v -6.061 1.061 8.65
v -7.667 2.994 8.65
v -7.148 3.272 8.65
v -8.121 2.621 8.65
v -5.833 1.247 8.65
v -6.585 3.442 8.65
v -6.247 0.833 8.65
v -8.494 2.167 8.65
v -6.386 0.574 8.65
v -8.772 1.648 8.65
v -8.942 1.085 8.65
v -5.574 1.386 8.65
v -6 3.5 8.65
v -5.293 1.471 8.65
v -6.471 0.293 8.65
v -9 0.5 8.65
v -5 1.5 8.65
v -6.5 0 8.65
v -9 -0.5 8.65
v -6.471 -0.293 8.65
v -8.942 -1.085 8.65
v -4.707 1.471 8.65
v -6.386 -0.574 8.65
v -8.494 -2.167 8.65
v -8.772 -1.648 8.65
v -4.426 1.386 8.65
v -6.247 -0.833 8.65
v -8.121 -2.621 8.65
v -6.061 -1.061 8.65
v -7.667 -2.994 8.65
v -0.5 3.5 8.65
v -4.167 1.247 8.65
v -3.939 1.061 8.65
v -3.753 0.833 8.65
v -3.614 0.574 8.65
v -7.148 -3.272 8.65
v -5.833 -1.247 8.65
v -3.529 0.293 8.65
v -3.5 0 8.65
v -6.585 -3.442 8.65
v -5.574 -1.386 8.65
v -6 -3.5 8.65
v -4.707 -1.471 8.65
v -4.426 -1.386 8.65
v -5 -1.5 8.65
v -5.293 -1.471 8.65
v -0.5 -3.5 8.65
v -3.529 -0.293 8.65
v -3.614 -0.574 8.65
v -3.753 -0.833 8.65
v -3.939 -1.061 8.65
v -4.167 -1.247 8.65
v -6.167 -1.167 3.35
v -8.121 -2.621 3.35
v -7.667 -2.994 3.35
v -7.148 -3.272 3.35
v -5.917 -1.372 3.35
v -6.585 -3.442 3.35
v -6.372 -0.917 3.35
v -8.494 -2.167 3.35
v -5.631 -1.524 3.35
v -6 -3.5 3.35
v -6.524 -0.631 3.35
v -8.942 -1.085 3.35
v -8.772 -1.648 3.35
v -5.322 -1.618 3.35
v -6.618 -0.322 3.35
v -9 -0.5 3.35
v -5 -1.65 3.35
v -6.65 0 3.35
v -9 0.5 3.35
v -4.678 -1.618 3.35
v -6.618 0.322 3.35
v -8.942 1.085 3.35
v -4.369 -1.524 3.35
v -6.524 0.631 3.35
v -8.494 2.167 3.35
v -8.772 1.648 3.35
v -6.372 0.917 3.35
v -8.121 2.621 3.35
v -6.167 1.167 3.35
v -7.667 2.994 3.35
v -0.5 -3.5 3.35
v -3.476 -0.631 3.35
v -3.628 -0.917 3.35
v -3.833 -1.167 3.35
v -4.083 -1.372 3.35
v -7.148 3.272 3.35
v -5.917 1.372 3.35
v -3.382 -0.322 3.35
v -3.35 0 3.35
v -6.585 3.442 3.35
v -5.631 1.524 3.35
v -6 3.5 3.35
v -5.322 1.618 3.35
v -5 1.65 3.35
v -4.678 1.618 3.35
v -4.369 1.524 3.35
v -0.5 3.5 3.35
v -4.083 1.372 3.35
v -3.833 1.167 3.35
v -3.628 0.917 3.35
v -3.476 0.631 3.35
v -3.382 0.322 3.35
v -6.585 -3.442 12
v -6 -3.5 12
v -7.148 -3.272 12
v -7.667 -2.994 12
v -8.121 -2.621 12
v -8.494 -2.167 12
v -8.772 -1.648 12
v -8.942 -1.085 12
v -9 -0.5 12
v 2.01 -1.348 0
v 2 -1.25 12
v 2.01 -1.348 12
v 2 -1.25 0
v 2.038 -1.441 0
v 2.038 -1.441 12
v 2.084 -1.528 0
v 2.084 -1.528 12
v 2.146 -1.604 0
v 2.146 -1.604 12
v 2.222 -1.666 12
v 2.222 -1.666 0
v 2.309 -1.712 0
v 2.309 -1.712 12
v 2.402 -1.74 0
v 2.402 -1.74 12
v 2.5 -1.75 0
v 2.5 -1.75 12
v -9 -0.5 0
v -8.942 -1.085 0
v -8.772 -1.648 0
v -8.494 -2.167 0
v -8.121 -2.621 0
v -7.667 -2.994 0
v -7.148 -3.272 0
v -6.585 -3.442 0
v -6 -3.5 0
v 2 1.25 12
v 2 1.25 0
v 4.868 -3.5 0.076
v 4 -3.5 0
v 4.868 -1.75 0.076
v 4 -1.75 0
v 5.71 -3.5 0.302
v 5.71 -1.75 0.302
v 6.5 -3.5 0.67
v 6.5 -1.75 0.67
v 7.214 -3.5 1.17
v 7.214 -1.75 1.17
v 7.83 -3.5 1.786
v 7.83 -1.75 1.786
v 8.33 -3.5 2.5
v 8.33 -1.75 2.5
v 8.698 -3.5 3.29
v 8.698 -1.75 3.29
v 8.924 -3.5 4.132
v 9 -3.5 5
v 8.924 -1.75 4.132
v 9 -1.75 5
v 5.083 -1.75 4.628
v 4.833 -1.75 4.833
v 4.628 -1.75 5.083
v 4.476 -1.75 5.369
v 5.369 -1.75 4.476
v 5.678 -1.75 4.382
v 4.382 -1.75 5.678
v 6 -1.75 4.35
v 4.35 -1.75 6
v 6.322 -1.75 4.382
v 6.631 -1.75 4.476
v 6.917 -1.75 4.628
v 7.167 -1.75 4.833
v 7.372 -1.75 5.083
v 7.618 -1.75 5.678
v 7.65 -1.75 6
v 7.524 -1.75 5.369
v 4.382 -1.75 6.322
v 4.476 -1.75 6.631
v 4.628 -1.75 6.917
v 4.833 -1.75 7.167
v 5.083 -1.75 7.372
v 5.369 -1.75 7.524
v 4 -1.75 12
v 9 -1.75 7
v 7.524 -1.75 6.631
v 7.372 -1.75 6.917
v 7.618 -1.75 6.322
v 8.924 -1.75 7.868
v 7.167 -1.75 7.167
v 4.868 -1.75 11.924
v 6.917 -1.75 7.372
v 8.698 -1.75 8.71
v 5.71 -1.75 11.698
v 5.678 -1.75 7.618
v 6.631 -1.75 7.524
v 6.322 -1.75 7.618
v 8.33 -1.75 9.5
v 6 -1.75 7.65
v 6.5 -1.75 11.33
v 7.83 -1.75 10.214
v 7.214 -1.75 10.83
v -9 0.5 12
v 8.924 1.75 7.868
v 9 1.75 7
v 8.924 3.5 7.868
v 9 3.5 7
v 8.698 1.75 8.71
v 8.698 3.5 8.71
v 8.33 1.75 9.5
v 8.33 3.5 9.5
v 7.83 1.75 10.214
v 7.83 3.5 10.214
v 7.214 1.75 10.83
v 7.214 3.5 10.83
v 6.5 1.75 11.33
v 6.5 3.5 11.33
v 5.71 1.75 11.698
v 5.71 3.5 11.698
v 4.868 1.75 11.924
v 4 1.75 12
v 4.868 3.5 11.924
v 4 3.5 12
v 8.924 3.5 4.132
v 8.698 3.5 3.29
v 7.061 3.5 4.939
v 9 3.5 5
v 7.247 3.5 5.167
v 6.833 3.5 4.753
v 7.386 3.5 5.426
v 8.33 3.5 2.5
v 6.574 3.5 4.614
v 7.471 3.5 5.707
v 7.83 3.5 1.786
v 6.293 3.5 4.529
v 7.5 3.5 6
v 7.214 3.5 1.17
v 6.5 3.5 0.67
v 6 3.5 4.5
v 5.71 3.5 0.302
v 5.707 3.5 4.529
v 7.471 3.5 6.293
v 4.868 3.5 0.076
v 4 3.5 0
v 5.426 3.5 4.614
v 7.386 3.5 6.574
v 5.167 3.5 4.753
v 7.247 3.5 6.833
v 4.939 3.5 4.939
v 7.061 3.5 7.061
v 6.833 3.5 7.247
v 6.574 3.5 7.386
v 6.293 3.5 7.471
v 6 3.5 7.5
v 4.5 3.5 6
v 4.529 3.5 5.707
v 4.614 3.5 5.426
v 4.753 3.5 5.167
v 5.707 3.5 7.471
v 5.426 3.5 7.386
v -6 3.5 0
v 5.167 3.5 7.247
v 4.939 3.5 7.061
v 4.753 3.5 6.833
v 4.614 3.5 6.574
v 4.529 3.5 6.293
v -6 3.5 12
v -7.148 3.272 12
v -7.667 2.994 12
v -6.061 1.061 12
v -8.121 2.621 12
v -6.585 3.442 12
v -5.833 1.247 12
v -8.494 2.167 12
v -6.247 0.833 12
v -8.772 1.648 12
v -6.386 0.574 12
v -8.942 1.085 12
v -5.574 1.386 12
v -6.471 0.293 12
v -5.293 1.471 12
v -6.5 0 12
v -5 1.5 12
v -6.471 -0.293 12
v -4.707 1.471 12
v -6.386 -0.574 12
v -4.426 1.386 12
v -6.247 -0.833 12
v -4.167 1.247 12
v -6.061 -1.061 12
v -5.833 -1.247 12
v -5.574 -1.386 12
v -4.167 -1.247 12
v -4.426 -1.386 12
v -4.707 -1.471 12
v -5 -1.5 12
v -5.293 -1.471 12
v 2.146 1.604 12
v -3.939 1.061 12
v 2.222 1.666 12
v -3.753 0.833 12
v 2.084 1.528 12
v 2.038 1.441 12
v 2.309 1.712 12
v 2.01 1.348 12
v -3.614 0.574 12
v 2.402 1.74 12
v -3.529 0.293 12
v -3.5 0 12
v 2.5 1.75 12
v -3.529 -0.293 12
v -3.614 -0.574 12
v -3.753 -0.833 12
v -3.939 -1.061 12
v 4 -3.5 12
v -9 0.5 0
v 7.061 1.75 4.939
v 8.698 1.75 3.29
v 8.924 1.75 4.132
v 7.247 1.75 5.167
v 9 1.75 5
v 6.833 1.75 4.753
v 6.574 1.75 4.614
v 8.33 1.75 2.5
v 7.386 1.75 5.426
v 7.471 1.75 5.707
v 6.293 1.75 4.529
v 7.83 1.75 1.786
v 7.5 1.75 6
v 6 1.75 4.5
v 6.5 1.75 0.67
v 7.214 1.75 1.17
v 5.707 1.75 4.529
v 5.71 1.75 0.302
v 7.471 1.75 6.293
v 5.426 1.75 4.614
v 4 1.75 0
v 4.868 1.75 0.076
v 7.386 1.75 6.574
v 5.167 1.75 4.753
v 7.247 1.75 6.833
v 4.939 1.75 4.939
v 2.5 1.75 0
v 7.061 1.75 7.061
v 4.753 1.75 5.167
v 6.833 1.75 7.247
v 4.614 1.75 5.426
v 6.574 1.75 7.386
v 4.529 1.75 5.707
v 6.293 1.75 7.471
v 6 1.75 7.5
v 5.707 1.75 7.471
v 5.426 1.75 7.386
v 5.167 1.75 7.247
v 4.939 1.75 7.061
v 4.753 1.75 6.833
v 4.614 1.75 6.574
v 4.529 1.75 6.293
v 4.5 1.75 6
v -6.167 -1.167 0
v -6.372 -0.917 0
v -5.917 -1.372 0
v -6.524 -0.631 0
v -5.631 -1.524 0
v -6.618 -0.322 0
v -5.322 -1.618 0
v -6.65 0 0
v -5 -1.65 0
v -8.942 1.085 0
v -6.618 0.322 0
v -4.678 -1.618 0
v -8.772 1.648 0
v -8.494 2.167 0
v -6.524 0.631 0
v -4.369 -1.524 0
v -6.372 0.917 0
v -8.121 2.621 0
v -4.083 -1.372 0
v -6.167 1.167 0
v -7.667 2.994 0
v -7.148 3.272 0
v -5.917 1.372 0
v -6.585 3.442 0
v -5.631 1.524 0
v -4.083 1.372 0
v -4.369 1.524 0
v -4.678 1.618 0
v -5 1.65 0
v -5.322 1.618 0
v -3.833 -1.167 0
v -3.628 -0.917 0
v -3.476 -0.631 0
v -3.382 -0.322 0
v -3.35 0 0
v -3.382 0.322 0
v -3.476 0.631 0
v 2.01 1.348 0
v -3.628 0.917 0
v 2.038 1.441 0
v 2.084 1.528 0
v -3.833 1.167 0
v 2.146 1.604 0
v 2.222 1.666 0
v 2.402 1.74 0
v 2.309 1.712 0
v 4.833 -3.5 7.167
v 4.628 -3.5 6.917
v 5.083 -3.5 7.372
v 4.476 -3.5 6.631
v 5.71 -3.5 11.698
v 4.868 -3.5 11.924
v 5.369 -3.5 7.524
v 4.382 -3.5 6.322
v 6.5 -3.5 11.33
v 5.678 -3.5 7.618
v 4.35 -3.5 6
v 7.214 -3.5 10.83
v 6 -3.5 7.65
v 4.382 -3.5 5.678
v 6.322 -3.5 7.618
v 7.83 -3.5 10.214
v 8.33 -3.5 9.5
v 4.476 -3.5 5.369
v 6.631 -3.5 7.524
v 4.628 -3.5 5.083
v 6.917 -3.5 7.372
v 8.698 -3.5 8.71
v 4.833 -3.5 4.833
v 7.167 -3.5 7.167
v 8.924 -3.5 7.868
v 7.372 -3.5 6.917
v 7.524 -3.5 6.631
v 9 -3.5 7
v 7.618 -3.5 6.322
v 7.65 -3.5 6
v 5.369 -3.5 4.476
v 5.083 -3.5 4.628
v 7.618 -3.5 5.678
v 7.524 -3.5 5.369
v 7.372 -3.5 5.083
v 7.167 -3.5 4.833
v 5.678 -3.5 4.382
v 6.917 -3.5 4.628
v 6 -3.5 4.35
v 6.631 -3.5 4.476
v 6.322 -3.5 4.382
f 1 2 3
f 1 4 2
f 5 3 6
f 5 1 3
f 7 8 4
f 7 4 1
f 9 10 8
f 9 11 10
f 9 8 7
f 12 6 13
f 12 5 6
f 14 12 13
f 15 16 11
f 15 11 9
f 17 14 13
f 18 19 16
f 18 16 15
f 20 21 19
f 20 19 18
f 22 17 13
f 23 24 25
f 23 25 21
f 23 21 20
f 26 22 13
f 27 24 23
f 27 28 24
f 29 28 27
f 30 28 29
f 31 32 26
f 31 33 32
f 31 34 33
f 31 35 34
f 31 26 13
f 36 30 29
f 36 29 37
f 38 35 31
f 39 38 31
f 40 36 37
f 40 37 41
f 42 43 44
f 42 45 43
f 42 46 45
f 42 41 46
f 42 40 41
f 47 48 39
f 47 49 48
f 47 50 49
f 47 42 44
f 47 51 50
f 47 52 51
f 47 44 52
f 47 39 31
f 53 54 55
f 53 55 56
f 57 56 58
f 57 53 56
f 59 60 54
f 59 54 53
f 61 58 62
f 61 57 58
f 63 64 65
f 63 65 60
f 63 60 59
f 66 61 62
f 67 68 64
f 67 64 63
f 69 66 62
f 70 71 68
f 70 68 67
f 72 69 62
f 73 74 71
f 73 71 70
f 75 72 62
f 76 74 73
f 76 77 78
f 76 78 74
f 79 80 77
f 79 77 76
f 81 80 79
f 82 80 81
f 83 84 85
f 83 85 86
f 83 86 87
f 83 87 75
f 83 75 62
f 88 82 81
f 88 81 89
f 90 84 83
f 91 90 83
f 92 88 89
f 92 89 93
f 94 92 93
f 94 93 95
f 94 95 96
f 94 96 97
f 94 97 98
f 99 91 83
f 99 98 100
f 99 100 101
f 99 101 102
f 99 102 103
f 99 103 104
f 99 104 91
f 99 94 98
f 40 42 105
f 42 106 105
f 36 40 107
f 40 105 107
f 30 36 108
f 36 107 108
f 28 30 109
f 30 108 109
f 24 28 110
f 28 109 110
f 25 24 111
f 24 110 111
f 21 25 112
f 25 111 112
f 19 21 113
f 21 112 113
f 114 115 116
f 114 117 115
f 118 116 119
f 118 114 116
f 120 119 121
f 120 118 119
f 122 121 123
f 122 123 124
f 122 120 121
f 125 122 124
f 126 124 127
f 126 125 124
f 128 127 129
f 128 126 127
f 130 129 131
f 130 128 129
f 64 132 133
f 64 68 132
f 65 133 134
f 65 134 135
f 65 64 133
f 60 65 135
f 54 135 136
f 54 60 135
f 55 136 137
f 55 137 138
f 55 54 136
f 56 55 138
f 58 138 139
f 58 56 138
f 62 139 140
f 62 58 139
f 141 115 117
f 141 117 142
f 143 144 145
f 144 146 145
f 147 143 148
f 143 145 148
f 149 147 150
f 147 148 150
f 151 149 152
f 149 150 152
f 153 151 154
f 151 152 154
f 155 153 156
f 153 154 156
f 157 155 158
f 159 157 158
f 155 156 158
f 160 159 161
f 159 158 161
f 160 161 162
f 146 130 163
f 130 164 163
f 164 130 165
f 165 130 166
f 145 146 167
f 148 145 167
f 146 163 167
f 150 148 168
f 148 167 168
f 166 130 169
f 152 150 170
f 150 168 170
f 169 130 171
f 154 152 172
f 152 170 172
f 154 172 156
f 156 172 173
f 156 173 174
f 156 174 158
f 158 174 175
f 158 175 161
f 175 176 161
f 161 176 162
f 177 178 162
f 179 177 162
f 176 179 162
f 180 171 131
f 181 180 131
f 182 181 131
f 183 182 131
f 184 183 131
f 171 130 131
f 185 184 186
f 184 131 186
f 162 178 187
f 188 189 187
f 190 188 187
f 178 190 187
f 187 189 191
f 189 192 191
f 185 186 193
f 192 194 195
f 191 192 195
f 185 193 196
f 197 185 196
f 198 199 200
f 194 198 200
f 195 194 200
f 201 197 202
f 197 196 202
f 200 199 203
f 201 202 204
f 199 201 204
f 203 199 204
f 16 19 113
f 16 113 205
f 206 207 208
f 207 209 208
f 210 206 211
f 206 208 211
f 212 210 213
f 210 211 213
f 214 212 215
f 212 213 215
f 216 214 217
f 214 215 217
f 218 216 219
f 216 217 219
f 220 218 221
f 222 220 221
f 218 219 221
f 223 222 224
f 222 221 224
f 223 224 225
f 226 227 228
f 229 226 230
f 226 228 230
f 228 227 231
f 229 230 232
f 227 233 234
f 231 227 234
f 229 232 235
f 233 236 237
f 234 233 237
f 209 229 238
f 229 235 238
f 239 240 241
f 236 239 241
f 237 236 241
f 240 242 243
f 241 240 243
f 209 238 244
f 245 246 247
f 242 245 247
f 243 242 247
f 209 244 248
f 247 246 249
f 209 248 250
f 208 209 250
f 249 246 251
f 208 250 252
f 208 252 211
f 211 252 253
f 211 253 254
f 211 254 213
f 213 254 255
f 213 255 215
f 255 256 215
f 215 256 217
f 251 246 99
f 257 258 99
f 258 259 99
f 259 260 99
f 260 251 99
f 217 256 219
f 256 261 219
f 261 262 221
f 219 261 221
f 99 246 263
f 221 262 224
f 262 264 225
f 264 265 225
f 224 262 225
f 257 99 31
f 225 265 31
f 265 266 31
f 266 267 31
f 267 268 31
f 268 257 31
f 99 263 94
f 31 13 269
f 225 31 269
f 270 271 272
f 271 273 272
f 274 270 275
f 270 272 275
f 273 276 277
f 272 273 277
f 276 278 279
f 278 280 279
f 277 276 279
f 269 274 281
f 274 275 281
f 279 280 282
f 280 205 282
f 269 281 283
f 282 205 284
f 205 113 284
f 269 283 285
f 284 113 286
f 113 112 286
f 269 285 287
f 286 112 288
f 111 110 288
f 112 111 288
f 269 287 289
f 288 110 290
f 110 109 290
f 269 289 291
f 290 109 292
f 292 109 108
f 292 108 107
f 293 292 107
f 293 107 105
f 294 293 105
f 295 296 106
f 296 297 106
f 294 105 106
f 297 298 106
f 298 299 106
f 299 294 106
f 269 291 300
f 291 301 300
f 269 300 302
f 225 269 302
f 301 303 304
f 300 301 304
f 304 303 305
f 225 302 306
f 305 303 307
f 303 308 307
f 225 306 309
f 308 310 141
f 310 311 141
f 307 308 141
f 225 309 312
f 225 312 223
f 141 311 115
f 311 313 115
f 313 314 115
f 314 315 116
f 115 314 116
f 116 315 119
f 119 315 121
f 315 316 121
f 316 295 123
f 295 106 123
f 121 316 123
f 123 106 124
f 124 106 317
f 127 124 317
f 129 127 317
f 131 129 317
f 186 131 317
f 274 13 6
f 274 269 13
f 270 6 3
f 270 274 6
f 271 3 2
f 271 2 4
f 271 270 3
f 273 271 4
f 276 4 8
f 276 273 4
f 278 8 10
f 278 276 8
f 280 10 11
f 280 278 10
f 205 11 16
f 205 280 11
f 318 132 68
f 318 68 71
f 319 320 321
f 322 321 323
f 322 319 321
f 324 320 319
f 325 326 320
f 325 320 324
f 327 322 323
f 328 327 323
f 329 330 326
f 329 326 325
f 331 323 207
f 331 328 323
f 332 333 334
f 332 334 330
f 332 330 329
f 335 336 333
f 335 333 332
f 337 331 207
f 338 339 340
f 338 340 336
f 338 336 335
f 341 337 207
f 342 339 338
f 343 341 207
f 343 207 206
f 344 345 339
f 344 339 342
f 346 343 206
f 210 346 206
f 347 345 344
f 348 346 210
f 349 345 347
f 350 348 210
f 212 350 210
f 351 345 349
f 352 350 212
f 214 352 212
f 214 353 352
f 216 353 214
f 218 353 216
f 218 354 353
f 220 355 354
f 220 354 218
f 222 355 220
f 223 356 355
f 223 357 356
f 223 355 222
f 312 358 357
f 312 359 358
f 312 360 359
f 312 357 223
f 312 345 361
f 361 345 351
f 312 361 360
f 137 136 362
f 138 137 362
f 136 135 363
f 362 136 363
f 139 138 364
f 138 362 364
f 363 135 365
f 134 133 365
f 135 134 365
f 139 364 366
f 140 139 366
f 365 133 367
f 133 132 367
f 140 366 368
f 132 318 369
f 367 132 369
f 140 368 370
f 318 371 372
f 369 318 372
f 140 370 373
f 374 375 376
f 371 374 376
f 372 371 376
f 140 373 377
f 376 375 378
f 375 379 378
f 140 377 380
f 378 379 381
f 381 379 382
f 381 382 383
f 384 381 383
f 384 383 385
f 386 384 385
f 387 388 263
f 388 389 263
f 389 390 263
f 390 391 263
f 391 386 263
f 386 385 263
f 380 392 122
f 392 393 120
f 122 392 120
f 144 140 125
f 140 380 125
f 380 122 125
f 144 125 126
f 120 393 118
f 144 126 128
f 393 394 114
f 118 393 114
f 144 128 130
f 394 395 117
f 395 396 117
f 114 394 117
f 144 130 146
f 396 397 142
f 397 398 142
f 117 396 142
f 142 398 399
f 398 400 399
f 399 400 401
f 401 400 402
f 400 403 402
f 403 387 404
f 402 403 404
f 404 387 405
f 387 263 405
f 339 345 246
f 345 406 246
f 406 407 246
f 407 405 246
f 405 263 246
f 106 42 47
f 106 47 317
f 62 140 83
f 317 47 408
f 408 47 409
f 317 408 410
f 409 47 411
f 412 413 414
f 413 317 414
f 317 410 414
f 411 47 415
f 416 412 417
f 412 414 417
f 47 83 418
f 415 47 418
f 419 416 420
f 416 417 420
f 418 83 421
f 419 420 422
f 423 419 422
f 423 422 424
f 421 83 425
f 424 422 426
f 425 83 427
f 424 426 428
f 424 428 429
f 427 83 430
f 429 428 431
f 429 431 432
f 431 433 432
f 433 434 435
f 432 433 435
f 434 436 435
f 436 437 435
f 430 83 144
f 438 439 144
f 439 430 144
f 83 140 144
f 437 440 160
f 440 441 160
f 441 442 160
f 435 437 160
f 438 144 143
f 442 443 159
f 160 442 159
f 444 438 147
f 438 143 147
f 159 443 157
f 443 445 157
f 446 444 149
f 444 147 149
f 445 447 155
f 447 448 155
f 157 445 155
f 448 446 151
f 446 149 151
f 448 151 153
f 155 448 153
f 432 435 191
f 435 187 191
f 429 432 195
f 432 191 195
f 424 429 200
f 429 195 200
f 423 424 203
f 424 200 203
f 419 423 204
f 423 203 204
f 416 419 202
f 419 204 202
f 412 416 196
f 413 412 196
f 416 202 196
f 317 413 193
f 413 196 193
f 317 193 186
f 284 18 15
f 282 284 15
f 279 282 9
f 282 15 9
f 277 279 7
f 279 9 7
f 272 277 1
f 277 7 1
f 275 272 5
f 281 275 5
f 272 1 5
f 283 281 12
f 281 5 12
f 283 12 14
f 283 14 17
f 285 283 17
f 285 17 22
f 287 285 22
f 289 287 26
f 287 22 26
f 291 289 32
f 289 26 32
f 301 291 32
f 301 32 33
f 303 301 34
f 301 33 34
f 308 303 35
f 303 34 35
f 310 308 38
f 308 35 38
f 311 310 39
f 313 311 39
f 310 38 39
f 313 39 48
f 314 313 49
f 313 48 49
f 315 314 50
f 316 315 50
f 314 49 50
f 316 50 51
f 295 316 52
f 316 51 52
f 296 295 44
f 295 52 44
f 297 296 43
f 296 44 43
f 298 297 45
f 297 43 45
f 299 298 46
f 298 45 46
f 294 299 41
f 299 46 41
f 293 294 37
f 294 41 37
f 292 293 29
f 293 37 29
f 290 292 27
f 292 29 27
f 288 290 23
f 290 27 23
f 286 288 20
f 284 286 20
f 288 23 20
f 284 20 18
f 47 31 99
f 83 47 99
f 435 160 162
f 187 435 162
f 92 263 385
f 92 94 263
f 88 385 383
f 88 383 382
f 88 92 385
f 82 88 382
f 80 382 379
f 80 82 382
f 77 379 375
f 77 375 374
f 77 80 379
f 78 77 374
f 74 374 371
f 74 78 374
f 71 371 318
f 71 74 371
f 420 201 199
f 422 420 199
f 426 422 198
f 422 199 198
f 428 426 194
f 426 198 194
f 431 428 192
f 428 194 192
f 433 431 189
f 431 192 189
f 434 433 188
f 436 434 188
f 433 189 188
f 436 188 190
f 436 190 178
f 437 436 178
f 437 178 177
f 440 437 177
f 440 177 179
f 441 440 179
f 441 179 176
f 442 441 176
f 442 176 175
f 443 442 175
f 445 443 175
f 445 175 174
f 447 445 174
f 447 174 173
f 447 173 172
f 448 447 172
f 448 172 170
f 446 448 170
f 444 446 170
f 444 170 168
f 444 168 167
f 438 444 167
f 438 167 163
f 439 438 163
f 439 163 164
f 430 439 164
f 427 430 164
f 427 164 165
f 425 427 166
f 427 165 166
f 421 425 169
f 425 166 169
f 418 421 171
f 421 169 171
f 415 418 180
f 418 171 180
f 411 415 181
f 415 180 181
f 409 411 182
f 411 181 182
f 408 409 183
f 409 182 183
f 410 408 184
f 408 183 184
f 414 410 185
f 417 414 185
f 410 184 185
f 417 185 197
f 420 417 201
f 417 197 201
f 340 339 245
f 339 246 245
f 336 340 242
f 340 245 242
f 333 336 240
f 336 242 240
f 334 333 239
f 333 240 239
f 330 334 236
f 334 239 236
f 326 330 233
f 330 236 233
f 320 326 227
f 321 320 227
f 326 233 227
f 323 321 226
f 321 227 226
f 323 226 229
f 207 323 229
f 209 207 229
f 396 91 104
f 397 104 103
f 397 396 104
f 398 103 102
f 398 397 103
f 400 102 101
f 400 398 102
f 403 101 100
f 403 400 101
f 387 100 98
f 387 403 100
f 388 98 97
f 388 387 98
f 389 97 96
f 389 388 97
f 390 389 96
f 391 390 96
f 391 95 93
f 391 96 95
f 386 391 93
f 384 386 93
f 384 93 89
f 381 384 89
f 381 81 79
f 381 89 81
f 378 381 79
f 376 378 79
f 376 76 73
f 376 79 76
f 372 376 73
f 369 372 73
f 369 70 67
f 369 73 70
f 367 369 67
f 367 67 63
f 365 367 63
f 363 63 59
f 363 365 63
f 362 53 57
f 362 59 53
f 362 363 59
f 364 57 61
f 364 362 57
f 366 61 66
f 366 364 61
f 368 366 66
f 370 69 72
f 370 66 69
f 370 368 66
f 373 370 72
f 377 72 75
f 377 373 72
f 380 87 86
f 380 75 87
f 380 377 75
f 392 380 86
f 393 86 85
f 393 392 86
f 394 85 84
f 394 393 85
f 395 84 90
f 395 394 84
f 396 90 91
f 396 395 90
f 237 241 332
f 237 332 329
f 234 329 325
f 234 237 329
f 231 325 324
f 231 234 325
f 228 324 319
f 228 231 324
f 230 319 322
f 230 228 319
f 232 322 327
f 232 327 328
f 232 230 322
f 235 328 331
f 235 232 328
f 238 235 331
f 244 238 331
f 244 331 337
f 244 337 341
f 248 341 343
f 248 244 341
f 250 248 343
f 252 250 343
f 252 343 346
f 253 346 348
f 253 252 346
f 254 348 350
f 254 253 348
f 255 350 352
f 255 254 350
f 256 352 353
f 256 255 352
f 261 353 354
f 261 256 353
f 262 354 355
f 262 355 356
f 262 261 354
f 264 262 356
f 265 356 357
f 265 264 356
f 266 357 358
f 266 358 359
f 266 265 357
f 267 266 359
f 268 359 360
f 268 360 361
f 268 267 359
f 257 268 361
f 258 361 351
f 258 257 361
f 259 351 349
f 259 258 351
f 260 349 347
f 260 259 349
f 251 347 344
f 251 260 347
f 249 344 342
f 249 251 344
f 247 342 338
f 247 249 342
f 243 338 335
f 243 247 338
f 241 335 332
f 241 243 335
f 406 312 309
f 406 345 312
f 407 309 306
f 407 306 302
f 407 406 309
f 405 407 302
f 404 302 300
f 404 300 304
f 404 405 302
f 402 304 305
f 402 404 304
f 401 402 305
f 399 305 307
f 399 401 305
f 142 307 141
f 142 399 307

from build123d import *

# Parameters (mm, degrees)
SKETCH_1_W          = 18
SKETCH_1_H          = 7
SKETCH_1_R          = 1.65
EXTRUDE_1_DEPTH     = 12
SKETCH_2_W          = 8.5
SKETCH_2_H          = 5.3
CUT_EXTRUDE_1_DEPTH = 12
SKETCH_3_W          = 14
SKETCH_3_H          = 3.5
CUT_EXTRUDE_2_DEPTH = 12
SKETCH_4_R          = 1.65
CUT_EXTRUDE_3_DEPTH = 12
FILLET_1_R          = 5
FILLET_2_R          = 3
FILLET_3_R          = 0.5
SKETCH_6_R          = 1.65
SKETCH_6_R_2        = 1.5
EXTRUDE_2_DEPTH     = 3.35
EXTRUDE_START       = -1.75
SKETCH_7_R          = 1.65
SKETCH_7_R_2        = 1.5
EXTRUDE_3_DEPTH     = 1.75


with BuildPart() as part:
    # 草图1 → 凸台-拉伸1 (new body)
    with BuildSketch(Plane.XY):
        Rectangle(SKETCH_1_W, SKETCH_1_H)
        with Locations((-5, 0)):
            Circle(SKETCH_1_R, mode=Mode.SUBTRACT)
    extrude(amount=EXTRUDE_1_DEPTH)

    # 草图2 → 切除-拉伸1 (cut)
    with BuildSketch(Plane(origin=(0, 3.5, 0), x_dir=(1, 0, 0), z_dir=(0, 1, 0))):
        with Locations((-4.75, -6)):
            Rectangle(SKETCH_2_W, SKETCH_2_H)
    extrude(amount=-CUT_EXTRUDE_1_DEPTH, mode=Mode.SUBTRACT)

    # 草图3 → 切除-拉伸2 (cut)
    with BuildSketch(Plane.XY.offset(12)):
        with Locations((9, 0)):
            Rectangle(SKETCH_3_W, SKETCH_3_H)
    extrude(amount=-CUT_EXTRUDE_2_DEPTH, mode=Mode.SUBTRACT)

    # 草图4 → 切除-拉伸3 (cut)
    with BuildSketch(Plane(origin=(0, 3.5, 0), x_dir=(1, 0, 0), z_dir=(0, 1, 0))):
        with Locations(Location((6, -6, 0), (0, 0, 270))):
            Circle(SKETCH_4_R)
    extrude(amount=-CUT_EXTRUDE_3_DEPTH, mode=Mode.SUBTRACT)

    # 圆角1
    fillet_1_edges = [part.edges().sort_by_distance(p)[0] for p in [
        (9, 2.625, 0),
        (9, 2.625, 12),
        (9, -2.625, 12),
        (9, -2.625, 0),
    ]]
    fillet(fillet_1_edges, radius=FILLET_1_R)

    # 圆角2
    fillet_2_edges = [part.edges().sort_by_distance(p)[0] for p in [
        (-9, -3.5, 1.675),
        (-9, 3.5, 1.675),
        (-9, -3.5, 10.325),
        (-9, 3.5, 10.325),
    ]]
    fillet(fillet_2_edges, radius=FILLET_2_R)

    # 圆角3
    fillet_3_edges = [part.edges().sort_by_distance(p)[0] for p in [
        (2, 1.75, 6),
        (2, -1.75, 6),
    ]]
    fillet(fillet_3_edges, radius=FILLET_3_R)

    # 草图6 → 凸台-拉伸2 (add)
    with BuildSketch(Plane(origin=(0, 0, 8.65), x_dir=(-1, 0, 0), z_dir=(0, 0, -1))):
        with Locations(Location((5, 0, 0), (0, 0, 180))):
            Circle(SKETCH_6_R)
        with Locations((5, 0)):
            Circle(SKETCH_6_R_2, mode=Mode.SUBTRACT)
    extrude(amount=-EXTRUDE_2_DEPTH)

    # 草图7 → 凸台-拉伸3 (add)
    with BuildSketch(Plane.XZ.offset(-1.75).offset(EXTRUDE_START)):
        with Locations(Location((6, 6, 0), (0, 0, 90))):
            Circle(SKETCH_7_R)
        with Locations(Location((6, 6, 0), (0, 0, 270))):
            Circle(SKETCH_7_R_2, mode=Mode.SUBTRACT)
    extrude(amount=EXTRUDE_3_DEPTH)


solid = part.part
